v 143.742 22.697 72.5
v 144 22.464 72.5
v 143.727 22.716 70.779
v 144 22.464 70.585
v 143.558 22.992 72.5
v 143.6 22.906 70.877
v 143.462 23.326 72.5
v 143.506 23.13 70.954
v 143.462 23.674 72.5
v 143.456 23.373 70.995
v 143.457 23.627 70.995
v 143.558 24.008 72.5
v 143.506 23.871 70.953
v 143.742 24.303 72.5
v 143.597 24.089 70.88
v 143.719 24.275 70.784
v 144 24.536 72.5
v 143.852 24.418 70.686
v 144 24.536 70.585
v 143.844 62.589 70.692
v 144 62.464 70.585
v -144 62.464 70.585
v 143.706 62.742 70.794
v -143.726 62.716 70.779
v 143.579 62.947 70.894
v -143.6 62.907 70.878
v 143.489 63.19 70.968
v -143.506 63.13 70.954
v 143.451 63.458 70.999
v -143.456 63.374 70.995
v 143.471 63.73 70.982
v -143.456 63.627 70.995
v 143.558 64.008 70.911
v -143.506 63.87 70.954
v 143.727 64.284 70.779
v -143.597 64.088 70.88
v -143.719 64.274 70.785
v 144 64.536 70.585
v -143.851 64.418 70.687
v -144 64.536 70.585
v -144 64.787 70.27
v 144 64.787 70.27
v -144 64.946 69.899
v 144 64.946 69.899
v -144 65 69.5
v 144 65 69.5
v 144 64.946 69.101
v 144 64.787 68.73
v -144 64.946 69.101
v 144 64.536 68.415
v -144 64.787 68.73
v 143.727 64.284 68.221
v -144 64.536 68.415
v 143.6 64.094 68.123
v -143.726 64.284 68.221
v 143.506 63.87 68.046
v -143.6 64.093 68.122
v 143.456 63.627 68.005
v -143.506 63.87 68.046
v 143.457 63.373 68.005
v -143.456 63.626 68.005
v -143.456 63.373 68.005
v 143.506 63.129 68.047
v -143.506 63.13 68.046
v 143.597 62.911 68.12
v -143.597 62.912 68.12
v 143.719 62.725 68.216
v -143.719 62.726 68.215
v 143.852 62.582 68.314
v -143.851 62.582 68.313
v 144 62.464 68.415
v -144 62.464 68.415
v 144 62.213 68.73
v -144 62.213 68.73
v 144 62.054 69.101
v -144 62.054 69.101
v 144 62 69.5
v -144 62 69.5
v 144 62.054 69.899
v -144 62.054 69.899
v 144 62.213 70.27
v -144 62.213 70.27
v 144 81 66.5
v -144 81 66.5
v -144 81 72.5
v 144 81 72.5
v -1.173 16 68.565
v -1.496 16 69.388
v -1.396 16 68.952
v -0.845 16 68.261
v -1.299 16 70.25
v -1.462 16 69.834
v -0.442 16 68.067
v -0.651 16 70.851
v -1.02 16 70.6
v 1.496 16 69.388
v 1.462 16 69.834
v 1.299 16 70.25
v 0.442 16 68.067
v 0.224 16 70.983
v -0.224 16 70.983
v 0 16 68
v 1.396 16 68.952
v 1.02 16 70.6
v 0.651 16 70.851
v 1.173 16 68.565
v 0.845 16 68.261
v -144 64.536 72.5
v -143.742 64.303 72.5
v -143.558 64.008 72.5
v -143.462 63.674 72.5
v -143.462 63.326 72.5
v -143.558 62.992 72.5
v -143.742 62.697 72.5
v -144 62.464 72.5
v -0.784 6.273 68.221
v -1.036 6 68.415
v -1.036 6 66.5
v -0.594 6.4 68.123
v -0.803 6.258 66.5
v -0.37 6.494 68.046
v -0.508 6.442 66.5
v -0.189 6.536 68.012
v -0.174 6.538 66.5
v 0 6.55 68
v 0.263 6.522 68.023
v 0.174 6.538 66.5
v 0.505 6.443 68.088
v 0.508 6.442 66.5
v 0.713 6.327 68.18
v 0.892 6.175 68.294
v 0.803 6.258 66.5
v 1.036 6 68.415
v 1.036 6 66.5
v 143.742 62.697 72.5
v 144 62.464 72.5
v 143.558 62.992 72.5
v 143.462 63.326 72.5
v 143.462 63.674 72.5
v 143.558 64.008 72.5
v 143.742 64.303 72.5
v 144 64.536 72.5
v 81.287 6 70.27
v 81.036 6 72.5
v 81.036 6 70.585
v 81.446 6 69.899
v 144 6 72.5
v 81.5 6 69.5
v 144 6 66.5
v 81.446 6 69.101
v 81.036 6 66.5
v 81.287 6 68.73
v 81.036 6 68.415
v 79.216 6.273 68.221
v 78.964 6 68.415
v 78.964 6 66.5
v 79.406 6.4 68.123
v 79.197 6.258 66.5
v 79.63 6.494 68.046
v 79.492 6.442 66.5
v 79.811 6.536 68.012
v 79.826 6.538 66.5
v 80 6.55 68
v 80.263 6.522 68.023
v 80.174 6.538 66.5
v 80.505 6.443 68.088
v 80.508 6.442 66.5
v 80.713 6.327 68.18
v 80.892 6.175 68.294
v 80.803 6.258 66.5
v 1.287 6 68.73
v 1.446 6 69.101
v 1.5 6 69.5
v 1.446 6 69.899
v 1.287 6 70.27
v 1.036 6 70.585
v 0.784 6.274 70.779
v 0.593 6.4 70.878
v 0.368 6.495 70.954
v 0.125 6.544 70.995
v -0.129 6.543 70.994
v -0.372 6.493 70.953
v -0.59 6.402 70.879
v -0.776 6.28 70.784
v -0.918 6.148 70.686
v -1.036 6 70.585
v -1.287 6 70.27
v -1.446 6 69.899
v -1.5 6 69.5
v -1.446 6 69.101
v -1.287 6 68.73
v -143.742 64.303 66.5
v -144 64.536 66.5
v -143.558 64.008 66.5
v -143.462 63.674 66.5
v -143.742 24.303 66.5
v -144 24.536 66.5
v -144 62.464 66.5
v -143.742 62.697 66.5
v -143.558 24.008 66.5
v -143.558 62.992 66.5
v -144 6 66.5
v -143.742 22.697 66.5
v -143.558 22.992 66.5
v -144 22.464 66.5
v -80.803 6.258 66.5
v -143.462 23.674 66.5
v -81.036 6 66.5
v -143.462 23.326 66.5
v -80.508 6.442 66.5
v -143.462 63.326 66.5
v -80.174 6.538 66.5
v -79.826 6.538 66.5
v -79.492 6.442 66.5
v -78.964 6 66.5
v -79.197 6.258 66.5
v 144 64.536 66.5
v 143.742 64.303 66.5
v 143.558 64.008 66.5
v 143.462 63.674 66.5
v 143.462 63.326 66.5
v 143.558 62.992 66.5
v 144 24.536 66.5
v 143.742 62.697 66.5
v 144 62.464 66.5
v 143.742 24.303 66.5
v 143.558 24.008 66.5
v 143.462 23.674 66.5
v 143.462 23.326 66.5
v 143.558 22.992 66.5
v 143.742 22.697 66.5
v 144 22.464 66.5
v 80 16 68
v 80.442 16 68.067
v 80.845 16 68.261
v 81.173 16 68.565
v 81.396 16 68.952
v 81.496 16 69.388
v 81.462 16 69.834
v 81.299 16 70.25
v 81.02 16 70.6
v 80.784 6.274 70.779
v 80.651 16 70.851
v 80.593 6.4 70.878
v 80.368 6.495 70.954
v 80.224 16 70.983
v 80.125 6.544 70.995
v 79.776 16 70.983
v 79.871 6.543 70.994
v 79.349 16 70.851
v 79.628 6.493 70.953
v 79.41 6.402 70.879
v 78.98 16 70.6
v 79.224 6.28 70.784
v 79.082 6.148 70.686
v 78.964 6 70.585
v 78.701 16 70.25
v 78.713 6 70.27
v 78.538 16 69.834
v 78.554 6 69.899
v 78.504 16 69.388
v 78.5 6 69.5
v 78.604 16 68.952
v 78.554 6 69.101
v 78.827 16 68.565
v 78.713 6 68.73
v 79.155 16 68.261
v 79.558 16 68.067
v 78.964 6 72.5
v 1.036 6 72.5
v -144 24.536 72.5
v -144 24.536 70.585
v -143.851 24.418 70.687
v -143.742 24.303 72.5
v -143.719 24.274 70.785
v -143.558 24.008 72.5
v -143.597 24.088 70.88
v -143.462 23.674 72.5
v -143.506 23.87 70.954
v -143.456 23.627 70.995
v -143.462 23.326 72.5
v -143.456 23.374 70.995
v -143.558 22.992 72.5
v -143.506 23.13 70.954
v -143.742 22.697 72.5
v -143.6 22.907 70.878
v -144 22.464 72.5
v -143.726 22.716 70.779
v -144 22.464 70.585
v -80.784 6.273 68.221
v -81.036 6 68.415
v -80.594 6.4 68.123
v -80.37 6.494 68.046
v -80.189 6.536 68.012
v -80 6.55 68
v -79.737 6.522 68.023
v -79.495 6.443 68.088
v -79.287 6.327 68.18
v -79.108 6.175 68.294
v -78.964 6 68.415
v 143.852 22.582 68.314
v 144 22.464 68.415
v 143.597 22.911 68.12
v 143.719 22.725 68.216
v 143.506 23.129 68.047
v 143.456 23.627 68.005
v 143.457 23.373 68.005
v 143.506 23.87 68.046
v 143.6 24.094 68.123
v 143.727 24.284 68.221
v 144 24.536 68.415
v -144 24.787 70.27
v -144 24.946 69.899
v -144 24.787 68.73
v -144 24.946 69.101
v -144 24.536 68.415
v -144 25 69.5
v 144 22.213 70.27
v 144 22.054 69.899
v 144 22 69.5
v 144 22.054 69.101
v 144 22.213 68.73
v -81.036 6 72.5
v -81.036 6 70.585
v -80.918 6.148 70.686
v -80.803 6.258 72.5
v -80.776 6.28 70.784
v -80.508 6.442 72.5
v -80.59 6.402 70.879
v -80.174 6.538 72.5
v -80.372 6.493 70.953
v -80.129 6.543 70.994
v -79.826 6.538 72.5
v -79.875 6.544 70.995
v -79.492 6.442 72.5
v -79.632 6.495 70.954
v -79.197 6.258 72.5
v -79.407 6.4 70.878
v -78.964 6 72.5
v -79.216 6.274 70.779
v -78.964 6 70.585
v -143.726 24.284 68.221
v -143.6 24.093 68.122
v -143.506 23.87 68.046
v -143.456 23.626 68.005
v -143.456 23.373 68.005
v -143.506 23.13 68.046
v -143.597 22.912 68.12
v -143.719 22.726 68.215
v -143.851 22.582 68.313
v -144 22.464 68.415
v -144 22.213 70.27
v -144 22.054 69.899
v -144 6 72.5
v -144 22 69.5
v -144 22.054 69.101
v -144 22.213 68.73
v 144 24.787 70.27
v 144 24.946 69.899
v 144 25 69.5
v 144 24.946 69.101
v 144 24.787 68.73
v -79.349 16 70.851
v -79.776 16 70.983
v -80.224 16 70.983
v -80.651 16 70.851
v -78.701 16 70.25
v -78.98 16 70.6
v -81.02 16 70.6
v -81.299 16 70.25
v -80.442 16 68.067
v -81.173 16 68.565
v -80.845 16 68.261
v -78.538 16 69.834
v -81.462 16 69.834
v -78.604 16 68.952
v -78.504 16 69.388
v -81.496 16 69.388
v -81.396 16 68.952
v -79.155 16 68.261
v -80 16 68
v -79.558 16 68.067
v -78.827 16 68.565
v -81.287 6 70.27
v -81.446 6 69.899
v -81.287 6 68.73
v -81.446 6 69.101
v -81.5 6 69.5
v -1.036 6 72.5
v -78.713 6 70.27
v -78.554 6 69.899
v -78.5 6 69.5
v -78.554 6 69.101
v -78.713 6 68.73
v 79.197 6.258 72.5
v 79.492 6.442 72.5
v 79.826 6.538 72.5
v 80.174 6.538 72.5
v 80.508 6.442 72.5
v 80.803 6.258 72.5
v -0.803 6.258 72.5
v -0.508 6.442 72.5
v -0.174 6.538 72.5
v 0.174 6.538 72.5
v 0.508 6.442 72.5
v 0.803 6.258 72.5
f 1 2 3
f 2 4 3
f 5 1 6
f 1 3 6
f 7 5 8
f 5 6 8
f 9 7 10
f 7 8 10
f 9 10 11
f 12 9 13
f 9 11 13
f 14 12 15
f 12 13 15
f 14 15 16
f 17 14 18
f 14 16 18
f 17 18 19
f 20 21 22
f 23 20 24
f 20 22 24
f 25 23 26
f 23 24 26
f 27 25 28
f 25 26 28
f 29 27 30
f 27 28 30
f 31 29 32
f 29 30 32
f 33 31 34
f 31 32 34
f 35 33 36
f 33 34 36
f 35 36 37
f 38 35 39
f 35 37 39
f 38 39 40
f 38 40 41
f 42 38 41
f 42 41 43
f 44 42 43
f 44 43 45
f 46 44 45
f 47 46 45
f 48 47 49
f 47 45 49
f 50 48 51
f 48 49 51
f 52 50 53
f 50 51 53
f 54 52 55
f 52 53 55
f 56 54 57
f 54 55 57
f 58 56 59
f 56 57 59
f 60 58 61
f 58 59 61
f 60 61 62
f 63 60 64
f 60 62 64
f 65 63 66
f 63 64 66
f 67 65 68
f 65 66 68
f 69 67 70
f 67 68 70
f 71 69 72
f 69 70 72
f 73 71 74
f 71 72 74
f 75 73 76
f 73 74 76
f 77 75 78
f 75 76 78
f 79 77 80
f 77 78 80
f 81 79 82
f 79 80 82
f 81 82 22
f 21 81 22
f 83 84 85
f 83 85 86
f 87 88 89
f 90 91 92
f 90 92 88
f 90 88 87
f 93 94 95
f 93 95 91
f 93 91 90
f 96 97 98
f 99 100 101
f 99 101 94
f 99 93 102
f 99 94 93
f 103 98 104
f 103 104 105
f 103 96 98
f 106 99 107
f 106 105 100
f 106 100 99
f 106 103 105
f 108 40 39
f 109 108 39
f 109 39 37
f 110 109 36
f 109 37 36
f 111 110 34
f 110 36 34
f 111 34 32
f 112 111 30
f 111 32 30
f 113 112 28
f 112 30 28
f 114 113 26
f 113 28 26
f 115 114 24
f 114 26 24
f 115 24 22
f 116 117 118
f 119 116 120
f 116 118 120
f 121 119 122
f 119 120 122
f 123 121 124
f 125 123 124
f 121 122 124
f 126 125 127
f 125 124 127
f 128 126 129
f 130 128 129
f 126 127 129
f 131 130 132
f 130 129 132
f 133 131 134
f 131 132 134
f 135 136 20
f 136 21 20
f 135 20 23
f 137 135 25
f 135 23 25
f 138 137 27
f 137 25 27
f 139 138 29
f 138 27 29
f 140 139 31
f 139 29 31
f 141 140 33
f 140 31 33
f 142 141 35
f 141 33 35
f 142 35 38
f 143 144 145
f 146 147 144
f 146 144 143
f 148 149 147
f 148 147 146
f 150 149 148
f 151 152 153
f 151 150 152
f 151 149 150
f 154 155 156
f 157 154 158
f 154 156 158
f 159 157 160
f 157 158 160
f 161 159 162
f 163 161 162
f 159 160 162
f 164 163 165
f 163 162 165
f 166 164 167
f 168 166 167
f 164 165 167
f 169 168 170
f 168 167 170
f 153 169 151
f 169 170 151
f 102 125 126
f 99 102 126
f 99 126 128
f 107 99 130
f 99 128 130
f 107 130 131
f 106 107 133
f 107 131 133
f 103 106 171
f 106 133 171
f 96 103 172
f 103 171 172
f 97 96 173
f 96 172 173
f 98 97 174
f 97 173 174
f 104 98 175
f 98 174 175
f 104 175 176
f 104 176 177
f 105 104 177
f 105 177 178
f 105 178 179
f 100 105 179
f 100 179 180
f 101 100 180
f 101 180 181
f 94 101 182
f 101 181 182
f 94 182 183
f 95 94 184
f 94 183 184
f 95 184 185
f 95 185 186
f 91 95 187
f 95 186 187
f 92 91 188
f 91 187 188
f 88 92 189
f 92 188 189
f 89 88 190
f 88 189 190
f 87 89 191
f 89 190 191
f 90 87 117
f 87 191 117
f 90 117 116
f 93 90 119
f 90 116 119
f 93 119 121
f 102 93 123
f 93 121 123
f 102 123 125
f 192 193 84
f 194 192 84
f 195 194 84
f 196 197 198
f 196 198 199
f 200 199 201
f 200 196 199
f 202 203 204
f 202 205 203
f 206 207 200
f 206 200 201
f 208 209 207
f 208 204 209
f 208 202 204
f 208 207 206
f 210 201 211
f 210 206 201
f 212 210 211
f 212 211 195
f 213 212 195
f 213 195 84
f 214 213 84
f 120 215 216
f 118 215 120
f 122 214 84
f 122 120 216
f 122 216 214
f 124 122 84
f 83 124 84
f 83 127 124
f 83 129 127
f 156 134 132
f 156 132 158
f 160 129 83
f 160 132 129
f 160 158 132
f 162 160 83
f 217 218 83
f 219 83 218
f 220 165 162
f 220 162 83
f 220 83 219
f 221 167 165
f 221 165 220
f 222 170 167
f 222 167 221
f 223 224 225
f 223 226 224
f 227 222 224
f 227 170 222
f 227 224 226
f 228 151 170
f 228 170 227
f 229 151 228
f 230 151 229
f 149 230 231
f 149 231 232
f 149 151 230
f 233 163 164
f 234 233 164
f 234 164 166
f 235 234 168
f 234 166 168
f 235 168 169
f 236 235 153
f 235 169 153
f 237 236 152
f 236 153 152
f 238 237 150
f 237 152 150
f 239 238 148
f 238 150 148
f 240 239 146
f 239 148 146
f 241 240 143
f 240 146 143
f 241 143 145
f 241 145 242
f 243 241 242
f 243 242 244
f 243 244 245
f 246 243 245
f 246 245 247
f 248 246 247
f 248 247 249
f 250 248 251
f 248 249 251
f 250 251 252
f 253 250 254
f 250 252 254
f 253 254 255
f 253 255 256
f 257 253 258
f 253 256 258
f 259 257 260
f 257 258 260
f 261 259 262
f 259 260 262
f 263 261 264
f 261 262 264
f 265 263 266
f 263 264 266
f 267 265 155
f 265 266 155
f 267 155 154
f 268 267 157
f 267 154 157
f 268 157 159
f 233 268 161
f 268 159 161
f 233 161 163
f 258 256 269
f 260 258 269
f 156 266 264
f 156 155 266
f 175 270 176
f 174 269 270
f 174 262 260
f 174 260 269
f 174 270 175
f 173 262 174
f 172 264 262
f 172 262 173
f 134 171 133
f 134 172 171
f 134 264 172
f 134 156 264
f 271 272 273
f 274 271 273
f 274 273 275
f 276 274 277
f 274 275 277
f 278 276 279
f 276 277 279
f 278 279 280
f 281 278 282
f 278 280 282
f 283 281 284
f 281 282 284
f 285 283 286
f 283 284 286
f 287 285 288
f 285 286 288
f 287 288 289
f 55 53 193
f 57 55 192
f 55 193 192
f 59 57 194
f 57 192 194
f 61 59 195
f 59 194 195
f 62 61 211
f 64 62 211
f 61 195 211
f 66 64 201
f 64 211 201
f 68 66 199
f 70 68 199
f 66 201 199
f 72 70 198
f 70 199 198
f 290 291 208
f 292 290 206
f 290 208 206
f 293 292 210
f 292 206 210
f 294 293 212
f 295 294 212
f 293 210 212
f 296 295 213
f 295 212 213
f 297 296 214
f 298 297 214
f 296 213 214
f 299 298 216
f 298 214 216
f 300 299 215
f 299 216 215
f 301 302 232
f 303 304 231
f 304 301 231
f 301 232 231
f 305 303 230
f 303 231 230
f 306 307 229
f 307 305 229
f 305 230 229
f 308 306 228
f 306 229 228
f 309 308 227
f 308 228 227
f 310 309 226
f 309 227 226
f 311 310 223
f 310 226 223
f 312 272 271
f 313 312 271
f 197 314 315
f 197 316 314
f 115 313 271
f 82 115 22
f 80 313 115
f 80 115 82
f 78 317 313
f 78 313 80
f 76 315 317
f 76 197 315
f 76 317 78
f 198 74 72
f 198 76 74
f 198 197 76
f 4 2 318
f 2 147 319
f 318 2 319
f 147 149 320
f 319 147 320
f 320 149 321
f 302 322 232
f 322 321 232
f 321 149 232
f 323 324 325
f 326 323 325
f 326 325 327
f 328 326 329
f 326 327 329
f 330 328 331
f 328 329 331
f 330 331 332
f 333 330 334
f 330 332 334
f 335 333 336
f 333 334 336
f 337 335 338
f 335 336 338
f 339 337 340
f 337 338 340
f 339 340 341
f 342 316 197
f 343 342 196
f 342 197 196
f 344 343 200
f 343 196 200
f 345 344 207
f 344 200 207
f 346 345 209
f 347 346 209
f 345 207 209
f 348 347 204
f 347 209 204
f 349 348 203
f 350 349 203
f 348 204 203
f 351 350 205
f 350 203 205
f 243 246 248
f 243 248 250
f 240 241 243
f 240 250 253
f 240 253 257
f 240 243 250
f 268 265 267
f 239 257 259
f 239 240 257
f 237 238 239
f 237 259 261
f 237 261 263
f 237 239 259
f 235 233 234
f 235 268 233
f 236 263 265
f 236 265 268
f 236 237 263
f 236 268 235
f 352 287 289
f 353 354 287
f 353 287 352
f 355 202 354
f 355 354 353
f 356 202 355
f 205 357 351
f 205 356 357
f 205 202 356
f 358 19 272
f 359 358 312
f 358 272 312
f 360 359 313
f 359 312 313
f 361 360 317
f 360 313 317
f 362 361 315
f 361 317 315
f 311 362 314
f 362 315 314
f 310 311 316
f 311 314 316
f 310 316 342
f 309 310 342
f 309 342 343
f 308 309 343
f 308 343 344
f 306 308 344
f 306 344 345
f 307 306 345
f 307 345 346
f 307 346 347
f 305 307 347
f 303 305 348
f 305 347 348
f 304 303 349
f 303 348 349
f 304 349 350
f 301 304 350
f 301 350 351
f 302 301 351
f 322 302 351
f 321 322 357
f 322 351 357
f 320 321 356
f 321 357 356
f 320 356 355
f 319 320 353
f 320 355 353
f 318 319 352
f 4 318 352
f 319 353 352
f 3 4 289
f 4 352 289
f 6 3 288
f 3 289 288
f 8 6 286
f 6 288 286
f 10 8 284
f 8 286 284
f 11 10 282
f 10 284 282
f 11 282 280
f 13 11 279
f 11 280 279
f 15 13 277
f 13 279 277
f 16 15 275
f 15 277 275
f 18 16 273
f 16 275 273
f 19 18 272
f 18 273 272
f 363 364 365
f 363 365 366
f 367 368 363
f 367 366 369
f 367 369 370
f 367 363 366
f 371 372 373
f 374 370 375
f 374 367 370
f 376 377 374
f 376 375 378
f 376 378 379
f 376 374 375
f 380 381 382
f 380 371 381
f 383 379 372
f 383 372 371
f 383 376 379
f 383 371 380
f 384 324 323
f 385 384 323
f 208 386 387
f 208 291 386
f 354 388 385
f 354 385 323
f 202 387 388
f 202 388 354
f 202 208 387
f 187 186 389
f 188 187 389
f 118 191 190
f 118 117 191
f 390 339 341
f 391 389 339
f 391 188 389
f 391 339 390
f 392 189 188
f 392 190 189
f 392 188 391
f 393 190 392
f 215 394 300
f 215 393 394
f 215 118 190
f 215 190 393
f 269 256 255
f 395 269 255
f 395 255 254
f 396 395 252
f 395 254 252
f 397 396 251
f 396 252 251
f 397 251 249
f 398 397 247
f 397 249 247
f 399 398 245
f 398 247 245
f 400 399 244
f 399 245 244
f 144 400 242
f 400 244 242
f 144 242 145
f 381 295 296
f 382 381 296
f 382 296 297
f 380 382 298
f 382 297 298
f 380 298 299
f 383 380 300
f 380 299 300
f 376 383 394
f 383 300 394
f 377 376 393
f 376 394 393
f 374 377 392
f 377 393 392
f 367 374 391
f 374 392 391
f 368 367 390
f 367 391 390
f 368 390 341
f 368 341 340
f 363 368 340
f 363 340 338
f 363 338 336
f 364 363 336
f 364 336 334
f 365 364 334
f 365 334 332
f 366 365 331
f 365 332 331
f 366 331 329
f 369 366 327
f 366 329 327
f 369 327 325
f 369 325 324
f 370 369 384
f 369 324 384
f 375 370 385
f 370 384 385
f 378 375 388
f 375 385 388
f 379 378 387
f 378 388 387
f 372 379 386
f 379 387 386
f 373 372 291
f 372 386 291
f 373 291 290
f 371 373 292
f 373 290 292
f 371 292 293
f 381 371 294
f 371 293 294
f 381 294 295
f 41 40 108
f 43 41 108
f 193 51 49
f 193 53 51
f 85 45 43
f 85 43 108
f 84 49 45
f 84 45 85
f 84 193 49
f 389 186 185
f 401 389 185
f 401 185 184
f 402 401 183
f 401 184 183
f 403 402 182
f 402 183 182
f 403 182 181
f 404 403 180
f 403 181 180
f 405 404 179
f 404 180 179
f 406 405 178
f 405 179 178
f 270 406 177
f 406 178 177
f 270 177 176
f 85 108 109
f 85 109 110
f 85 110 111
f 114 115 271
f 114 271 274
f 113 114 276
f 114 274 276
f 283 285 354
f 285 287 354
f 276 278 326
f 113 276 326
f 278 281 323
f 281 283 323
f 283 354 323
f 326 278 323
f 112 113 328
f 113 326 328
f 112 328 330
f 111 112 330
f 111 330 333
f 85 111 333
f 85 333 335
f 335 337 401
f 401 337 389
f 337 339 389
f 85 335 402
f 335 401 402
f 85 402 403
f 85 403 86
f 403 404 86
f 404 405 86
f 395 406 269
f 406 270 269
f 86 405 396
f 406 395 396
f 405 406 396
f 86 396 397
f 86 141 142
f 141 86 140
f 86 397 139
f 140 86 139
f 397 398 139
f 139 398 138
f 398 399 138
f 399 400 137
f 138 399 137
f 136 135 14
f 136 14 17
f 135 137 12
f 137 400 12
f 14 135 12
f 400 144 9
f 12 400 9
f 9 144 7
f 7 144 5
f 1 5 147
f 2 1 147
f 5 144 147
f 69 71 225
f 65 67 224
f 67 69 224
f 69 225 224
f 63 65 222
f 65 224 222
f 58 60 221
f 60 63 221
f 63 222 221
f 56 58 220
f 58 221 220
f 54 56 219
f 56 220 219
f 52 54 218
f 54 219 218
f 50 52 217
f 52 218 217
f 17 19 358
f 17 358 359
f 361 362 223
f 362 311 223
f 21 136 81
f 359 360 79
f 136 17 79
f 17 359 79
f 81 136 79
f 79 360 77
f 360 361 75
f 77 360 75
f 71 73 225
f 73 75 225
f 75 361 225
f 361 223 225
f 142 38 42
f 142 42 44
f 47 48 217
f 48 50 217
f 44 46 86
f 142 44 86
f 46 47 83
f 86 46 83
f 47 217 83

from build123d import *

# Parameters (mm, degrees)
SKETCH_1_W           = 300
SKETCH_1_H           = 145
EXTRUDE_1_DEPTH      = 81
SHELL_1_T            = -6
SKETCH_2_R           = 2.55
CUT_EXTRUDE_1_DEPTH  = 183.705363906
SKETCH_3_R           = 4.25
CUT_EXTRUDE_2_DEPTH  = 3
SKETCH_4_OUTSIDE_W   = 370.582
SKETCH_4_OUTSIDE_H   = 151.582
SKETCH_4_OUTSIDE_W_2 = 288
SKETCH_4_OUTSIDE_H_2 = 75
CUT_EXTRUDE_3_DEPTH  = 220.959087105
SKETCH_5_R           = 1.25
CUT_EXTRUDE_4_DEPTH  = 166.326948801
SKETCH_6_R           = 1.5
CUT_EXTRUDE_5_DEPTH  = 308.83315286
SKETCH_7_R           = 1.5
CUT_EXTRUDE_6_DEPTH  = 10


with BuildPart() as part:
    # ｽｹｯﾁ1 → ﾎﾞｽ - 押し出し1 (new body)
    with BuildSketch(Plane(origin=(0, 0, 0), x_dir=(1, 0, 0), z_dir=(0, 1, 0))):
        Rectangle(SKETCH_1_W, SKETCH_1_H)
    extrude(amount=EXTRUDE_1_DEPTH)

    # ｼｪﾙ1
    shell_1_openings = [part.faces().sort_by_distance(p)[0] for p in [
        (0, 81, 0),
    ]]
    offset(amount=SHELL_1_T, openings=shell_1_openings, kind=Kind.INTERSECTION)

    # ｽｹｯﾁ2 → ｶｯﾄ - 押し出し1 (cut, through all)
    with BuildSketch(Plane(origin=(0, 6, 0), x_dir=(1, 0, 0), z_dir=(0, 1, 0))):
        with Locations(Location((140, 60, 0), (0, 0, 270))):
            Circle(SKETCH_2_R)
        with Locations(Location((140, -60, 0), (0, 0, 90))):
            Circle(SKETCH_2_R)
        with Locations(Location((-22.5, -60, 0), (0, 0, 270))):
            Circle(SKETCH_2_R)
        with Locations(Location((-22.5, 60, 0), (0, 0, 90))):
            Circle(SKETCH_2_R)
    extrude(amount=-CUT_EXTRUDE_1_DEPTH, mode=Mode.SUBTRACT)

    # ｽｹｯﾁ3 → ｶｯﾄ - 押し出し2 (cut)
    with BuildSketch(Plane(origin=(0, 6, 0), x_dir=(1, 0, 0), z_dir=(0, 1, 0))):
        with Locations(Location((140, 60, 0), (0, 0, 270))):
            Circle(SKETCH_3_R)
        with Locations(Location((-22.5, 60, 0), (0, 0, 270))):
            Circle(SKETCH_3_R)
        with Locations(Location((-22.5, -60, 0), (0, 0, 270))):
            Circle(SKETCH_3_R)
        with Locations(Location((140, -60, 0), (0, 0, 270))):
            Circle(SKETCH_3_R)
    extrude(amount=-CUT_EXTRUDE_2_DEPTH, mode=Mode.SUBTRACT)

    # ｽｹｯﾁ4 outside → ｶｯﾄ - 押し出し3 (cut, through all)
    with BuildSketch(Plane(origin=(0, 0, 66.5), x_dir=(-1, 0, 0), z_dir=(0, 0, -1))):
        with Locations((0, 40.5)):
            Rectangle(SKETCH_4_OUTSIDE_W, SKETCH_4_OUTSIDE_H)
        with Locations((0, 43.5)):
            Rectangle(SKETCH_4_OUTSIDE_W_2, SKETCH_4_OUTSIDE_H_2, mode=Mode.SUBTRACT)
    extrude(amount=-CUT_EXTRUDE_3_DEPTH, mode=Mode.SUBTRACT)


with BuildPart() as cut_extrude_3_kept_piece:
    # of the separate pieces the step leaves, the one the design keeps (cut_extrude_3_pieces_kept)
    add(part.part.solids().sort_by_distance((144, 6, 72.5))[0])

    # ｽｹｯﾁ5 → ｶｯﾄ - 押し出し4 (cut, through all)
    with BuildSketch(Plane(origin=(0, 0, 66.5), x_dir=(-1, 0, 0), z_dir=(0, 0, -1))):
        with Locations((0, 5.3)):
            Circle(SKETCH_5_R)
        with Locations((-80, 5.3)):
            Circle(SKETCH_5_R)
        with Locations((80, 5.3)):
            Circle(SKETCH_5_R)
        with Locations((-144.7, 63.5)):
            Circle(SKETCH_5_R)
        with Locations((-144.7, 23.5)):
            Circle(SKETCH_5_R)
        with Locations((144.7, 23.5)):
            Circle(SKETCH_5_R)
        with Locations((144.7, 63.5)):
            Circle(SKETCH_5_R)
    extrude(amount=-CUT_EXTRUDE_4_DEPTH, mode=Mode.SUBTRACT)

    # ｽｹｯﾁ6 → ｶｯﾄ - 押し出し5 (cut, through all)
    with BuildSketch(Plane.ZY.offset(144)):
        with Locations(Location((69.5, 23.5, 0), (0, 0, 43.662612756))):
            Circle(SKETCH_6_R)
        with Locations(Location((69.5, 63.5, 0), (0, 0, 316.337387244))):
            Circle(SKETCH_6_R)
    extrude(amount=-CUT_EXTRUDE_5_DEPTH, mode=Mode.SUBTRACT)

    # ｽｹｯﾁ7 → ｶｯﾄ - 押し出し6 (cut)
    with BuildSketch(Plane.XZ.offset(-6)):
        with Locations(Location((80, 69.5, 0), (0, 0, 270))):
            Circle(SKETCH_7_R)
        with Locations(Location((0, 69.5, 0), (0, 0, 270))):
            Circle(SKETCH_7_R)
        with Locations(Location((-80, 69.5, 0), (0, 0, 270))):
            Circle(SKETCH_7_R)
    extrude(amount=-CUT_EXTRUDE_6_DEPTH, mode=Mode.SUBTRACT)


solid = cut_extrude_3_kept_piece.part
